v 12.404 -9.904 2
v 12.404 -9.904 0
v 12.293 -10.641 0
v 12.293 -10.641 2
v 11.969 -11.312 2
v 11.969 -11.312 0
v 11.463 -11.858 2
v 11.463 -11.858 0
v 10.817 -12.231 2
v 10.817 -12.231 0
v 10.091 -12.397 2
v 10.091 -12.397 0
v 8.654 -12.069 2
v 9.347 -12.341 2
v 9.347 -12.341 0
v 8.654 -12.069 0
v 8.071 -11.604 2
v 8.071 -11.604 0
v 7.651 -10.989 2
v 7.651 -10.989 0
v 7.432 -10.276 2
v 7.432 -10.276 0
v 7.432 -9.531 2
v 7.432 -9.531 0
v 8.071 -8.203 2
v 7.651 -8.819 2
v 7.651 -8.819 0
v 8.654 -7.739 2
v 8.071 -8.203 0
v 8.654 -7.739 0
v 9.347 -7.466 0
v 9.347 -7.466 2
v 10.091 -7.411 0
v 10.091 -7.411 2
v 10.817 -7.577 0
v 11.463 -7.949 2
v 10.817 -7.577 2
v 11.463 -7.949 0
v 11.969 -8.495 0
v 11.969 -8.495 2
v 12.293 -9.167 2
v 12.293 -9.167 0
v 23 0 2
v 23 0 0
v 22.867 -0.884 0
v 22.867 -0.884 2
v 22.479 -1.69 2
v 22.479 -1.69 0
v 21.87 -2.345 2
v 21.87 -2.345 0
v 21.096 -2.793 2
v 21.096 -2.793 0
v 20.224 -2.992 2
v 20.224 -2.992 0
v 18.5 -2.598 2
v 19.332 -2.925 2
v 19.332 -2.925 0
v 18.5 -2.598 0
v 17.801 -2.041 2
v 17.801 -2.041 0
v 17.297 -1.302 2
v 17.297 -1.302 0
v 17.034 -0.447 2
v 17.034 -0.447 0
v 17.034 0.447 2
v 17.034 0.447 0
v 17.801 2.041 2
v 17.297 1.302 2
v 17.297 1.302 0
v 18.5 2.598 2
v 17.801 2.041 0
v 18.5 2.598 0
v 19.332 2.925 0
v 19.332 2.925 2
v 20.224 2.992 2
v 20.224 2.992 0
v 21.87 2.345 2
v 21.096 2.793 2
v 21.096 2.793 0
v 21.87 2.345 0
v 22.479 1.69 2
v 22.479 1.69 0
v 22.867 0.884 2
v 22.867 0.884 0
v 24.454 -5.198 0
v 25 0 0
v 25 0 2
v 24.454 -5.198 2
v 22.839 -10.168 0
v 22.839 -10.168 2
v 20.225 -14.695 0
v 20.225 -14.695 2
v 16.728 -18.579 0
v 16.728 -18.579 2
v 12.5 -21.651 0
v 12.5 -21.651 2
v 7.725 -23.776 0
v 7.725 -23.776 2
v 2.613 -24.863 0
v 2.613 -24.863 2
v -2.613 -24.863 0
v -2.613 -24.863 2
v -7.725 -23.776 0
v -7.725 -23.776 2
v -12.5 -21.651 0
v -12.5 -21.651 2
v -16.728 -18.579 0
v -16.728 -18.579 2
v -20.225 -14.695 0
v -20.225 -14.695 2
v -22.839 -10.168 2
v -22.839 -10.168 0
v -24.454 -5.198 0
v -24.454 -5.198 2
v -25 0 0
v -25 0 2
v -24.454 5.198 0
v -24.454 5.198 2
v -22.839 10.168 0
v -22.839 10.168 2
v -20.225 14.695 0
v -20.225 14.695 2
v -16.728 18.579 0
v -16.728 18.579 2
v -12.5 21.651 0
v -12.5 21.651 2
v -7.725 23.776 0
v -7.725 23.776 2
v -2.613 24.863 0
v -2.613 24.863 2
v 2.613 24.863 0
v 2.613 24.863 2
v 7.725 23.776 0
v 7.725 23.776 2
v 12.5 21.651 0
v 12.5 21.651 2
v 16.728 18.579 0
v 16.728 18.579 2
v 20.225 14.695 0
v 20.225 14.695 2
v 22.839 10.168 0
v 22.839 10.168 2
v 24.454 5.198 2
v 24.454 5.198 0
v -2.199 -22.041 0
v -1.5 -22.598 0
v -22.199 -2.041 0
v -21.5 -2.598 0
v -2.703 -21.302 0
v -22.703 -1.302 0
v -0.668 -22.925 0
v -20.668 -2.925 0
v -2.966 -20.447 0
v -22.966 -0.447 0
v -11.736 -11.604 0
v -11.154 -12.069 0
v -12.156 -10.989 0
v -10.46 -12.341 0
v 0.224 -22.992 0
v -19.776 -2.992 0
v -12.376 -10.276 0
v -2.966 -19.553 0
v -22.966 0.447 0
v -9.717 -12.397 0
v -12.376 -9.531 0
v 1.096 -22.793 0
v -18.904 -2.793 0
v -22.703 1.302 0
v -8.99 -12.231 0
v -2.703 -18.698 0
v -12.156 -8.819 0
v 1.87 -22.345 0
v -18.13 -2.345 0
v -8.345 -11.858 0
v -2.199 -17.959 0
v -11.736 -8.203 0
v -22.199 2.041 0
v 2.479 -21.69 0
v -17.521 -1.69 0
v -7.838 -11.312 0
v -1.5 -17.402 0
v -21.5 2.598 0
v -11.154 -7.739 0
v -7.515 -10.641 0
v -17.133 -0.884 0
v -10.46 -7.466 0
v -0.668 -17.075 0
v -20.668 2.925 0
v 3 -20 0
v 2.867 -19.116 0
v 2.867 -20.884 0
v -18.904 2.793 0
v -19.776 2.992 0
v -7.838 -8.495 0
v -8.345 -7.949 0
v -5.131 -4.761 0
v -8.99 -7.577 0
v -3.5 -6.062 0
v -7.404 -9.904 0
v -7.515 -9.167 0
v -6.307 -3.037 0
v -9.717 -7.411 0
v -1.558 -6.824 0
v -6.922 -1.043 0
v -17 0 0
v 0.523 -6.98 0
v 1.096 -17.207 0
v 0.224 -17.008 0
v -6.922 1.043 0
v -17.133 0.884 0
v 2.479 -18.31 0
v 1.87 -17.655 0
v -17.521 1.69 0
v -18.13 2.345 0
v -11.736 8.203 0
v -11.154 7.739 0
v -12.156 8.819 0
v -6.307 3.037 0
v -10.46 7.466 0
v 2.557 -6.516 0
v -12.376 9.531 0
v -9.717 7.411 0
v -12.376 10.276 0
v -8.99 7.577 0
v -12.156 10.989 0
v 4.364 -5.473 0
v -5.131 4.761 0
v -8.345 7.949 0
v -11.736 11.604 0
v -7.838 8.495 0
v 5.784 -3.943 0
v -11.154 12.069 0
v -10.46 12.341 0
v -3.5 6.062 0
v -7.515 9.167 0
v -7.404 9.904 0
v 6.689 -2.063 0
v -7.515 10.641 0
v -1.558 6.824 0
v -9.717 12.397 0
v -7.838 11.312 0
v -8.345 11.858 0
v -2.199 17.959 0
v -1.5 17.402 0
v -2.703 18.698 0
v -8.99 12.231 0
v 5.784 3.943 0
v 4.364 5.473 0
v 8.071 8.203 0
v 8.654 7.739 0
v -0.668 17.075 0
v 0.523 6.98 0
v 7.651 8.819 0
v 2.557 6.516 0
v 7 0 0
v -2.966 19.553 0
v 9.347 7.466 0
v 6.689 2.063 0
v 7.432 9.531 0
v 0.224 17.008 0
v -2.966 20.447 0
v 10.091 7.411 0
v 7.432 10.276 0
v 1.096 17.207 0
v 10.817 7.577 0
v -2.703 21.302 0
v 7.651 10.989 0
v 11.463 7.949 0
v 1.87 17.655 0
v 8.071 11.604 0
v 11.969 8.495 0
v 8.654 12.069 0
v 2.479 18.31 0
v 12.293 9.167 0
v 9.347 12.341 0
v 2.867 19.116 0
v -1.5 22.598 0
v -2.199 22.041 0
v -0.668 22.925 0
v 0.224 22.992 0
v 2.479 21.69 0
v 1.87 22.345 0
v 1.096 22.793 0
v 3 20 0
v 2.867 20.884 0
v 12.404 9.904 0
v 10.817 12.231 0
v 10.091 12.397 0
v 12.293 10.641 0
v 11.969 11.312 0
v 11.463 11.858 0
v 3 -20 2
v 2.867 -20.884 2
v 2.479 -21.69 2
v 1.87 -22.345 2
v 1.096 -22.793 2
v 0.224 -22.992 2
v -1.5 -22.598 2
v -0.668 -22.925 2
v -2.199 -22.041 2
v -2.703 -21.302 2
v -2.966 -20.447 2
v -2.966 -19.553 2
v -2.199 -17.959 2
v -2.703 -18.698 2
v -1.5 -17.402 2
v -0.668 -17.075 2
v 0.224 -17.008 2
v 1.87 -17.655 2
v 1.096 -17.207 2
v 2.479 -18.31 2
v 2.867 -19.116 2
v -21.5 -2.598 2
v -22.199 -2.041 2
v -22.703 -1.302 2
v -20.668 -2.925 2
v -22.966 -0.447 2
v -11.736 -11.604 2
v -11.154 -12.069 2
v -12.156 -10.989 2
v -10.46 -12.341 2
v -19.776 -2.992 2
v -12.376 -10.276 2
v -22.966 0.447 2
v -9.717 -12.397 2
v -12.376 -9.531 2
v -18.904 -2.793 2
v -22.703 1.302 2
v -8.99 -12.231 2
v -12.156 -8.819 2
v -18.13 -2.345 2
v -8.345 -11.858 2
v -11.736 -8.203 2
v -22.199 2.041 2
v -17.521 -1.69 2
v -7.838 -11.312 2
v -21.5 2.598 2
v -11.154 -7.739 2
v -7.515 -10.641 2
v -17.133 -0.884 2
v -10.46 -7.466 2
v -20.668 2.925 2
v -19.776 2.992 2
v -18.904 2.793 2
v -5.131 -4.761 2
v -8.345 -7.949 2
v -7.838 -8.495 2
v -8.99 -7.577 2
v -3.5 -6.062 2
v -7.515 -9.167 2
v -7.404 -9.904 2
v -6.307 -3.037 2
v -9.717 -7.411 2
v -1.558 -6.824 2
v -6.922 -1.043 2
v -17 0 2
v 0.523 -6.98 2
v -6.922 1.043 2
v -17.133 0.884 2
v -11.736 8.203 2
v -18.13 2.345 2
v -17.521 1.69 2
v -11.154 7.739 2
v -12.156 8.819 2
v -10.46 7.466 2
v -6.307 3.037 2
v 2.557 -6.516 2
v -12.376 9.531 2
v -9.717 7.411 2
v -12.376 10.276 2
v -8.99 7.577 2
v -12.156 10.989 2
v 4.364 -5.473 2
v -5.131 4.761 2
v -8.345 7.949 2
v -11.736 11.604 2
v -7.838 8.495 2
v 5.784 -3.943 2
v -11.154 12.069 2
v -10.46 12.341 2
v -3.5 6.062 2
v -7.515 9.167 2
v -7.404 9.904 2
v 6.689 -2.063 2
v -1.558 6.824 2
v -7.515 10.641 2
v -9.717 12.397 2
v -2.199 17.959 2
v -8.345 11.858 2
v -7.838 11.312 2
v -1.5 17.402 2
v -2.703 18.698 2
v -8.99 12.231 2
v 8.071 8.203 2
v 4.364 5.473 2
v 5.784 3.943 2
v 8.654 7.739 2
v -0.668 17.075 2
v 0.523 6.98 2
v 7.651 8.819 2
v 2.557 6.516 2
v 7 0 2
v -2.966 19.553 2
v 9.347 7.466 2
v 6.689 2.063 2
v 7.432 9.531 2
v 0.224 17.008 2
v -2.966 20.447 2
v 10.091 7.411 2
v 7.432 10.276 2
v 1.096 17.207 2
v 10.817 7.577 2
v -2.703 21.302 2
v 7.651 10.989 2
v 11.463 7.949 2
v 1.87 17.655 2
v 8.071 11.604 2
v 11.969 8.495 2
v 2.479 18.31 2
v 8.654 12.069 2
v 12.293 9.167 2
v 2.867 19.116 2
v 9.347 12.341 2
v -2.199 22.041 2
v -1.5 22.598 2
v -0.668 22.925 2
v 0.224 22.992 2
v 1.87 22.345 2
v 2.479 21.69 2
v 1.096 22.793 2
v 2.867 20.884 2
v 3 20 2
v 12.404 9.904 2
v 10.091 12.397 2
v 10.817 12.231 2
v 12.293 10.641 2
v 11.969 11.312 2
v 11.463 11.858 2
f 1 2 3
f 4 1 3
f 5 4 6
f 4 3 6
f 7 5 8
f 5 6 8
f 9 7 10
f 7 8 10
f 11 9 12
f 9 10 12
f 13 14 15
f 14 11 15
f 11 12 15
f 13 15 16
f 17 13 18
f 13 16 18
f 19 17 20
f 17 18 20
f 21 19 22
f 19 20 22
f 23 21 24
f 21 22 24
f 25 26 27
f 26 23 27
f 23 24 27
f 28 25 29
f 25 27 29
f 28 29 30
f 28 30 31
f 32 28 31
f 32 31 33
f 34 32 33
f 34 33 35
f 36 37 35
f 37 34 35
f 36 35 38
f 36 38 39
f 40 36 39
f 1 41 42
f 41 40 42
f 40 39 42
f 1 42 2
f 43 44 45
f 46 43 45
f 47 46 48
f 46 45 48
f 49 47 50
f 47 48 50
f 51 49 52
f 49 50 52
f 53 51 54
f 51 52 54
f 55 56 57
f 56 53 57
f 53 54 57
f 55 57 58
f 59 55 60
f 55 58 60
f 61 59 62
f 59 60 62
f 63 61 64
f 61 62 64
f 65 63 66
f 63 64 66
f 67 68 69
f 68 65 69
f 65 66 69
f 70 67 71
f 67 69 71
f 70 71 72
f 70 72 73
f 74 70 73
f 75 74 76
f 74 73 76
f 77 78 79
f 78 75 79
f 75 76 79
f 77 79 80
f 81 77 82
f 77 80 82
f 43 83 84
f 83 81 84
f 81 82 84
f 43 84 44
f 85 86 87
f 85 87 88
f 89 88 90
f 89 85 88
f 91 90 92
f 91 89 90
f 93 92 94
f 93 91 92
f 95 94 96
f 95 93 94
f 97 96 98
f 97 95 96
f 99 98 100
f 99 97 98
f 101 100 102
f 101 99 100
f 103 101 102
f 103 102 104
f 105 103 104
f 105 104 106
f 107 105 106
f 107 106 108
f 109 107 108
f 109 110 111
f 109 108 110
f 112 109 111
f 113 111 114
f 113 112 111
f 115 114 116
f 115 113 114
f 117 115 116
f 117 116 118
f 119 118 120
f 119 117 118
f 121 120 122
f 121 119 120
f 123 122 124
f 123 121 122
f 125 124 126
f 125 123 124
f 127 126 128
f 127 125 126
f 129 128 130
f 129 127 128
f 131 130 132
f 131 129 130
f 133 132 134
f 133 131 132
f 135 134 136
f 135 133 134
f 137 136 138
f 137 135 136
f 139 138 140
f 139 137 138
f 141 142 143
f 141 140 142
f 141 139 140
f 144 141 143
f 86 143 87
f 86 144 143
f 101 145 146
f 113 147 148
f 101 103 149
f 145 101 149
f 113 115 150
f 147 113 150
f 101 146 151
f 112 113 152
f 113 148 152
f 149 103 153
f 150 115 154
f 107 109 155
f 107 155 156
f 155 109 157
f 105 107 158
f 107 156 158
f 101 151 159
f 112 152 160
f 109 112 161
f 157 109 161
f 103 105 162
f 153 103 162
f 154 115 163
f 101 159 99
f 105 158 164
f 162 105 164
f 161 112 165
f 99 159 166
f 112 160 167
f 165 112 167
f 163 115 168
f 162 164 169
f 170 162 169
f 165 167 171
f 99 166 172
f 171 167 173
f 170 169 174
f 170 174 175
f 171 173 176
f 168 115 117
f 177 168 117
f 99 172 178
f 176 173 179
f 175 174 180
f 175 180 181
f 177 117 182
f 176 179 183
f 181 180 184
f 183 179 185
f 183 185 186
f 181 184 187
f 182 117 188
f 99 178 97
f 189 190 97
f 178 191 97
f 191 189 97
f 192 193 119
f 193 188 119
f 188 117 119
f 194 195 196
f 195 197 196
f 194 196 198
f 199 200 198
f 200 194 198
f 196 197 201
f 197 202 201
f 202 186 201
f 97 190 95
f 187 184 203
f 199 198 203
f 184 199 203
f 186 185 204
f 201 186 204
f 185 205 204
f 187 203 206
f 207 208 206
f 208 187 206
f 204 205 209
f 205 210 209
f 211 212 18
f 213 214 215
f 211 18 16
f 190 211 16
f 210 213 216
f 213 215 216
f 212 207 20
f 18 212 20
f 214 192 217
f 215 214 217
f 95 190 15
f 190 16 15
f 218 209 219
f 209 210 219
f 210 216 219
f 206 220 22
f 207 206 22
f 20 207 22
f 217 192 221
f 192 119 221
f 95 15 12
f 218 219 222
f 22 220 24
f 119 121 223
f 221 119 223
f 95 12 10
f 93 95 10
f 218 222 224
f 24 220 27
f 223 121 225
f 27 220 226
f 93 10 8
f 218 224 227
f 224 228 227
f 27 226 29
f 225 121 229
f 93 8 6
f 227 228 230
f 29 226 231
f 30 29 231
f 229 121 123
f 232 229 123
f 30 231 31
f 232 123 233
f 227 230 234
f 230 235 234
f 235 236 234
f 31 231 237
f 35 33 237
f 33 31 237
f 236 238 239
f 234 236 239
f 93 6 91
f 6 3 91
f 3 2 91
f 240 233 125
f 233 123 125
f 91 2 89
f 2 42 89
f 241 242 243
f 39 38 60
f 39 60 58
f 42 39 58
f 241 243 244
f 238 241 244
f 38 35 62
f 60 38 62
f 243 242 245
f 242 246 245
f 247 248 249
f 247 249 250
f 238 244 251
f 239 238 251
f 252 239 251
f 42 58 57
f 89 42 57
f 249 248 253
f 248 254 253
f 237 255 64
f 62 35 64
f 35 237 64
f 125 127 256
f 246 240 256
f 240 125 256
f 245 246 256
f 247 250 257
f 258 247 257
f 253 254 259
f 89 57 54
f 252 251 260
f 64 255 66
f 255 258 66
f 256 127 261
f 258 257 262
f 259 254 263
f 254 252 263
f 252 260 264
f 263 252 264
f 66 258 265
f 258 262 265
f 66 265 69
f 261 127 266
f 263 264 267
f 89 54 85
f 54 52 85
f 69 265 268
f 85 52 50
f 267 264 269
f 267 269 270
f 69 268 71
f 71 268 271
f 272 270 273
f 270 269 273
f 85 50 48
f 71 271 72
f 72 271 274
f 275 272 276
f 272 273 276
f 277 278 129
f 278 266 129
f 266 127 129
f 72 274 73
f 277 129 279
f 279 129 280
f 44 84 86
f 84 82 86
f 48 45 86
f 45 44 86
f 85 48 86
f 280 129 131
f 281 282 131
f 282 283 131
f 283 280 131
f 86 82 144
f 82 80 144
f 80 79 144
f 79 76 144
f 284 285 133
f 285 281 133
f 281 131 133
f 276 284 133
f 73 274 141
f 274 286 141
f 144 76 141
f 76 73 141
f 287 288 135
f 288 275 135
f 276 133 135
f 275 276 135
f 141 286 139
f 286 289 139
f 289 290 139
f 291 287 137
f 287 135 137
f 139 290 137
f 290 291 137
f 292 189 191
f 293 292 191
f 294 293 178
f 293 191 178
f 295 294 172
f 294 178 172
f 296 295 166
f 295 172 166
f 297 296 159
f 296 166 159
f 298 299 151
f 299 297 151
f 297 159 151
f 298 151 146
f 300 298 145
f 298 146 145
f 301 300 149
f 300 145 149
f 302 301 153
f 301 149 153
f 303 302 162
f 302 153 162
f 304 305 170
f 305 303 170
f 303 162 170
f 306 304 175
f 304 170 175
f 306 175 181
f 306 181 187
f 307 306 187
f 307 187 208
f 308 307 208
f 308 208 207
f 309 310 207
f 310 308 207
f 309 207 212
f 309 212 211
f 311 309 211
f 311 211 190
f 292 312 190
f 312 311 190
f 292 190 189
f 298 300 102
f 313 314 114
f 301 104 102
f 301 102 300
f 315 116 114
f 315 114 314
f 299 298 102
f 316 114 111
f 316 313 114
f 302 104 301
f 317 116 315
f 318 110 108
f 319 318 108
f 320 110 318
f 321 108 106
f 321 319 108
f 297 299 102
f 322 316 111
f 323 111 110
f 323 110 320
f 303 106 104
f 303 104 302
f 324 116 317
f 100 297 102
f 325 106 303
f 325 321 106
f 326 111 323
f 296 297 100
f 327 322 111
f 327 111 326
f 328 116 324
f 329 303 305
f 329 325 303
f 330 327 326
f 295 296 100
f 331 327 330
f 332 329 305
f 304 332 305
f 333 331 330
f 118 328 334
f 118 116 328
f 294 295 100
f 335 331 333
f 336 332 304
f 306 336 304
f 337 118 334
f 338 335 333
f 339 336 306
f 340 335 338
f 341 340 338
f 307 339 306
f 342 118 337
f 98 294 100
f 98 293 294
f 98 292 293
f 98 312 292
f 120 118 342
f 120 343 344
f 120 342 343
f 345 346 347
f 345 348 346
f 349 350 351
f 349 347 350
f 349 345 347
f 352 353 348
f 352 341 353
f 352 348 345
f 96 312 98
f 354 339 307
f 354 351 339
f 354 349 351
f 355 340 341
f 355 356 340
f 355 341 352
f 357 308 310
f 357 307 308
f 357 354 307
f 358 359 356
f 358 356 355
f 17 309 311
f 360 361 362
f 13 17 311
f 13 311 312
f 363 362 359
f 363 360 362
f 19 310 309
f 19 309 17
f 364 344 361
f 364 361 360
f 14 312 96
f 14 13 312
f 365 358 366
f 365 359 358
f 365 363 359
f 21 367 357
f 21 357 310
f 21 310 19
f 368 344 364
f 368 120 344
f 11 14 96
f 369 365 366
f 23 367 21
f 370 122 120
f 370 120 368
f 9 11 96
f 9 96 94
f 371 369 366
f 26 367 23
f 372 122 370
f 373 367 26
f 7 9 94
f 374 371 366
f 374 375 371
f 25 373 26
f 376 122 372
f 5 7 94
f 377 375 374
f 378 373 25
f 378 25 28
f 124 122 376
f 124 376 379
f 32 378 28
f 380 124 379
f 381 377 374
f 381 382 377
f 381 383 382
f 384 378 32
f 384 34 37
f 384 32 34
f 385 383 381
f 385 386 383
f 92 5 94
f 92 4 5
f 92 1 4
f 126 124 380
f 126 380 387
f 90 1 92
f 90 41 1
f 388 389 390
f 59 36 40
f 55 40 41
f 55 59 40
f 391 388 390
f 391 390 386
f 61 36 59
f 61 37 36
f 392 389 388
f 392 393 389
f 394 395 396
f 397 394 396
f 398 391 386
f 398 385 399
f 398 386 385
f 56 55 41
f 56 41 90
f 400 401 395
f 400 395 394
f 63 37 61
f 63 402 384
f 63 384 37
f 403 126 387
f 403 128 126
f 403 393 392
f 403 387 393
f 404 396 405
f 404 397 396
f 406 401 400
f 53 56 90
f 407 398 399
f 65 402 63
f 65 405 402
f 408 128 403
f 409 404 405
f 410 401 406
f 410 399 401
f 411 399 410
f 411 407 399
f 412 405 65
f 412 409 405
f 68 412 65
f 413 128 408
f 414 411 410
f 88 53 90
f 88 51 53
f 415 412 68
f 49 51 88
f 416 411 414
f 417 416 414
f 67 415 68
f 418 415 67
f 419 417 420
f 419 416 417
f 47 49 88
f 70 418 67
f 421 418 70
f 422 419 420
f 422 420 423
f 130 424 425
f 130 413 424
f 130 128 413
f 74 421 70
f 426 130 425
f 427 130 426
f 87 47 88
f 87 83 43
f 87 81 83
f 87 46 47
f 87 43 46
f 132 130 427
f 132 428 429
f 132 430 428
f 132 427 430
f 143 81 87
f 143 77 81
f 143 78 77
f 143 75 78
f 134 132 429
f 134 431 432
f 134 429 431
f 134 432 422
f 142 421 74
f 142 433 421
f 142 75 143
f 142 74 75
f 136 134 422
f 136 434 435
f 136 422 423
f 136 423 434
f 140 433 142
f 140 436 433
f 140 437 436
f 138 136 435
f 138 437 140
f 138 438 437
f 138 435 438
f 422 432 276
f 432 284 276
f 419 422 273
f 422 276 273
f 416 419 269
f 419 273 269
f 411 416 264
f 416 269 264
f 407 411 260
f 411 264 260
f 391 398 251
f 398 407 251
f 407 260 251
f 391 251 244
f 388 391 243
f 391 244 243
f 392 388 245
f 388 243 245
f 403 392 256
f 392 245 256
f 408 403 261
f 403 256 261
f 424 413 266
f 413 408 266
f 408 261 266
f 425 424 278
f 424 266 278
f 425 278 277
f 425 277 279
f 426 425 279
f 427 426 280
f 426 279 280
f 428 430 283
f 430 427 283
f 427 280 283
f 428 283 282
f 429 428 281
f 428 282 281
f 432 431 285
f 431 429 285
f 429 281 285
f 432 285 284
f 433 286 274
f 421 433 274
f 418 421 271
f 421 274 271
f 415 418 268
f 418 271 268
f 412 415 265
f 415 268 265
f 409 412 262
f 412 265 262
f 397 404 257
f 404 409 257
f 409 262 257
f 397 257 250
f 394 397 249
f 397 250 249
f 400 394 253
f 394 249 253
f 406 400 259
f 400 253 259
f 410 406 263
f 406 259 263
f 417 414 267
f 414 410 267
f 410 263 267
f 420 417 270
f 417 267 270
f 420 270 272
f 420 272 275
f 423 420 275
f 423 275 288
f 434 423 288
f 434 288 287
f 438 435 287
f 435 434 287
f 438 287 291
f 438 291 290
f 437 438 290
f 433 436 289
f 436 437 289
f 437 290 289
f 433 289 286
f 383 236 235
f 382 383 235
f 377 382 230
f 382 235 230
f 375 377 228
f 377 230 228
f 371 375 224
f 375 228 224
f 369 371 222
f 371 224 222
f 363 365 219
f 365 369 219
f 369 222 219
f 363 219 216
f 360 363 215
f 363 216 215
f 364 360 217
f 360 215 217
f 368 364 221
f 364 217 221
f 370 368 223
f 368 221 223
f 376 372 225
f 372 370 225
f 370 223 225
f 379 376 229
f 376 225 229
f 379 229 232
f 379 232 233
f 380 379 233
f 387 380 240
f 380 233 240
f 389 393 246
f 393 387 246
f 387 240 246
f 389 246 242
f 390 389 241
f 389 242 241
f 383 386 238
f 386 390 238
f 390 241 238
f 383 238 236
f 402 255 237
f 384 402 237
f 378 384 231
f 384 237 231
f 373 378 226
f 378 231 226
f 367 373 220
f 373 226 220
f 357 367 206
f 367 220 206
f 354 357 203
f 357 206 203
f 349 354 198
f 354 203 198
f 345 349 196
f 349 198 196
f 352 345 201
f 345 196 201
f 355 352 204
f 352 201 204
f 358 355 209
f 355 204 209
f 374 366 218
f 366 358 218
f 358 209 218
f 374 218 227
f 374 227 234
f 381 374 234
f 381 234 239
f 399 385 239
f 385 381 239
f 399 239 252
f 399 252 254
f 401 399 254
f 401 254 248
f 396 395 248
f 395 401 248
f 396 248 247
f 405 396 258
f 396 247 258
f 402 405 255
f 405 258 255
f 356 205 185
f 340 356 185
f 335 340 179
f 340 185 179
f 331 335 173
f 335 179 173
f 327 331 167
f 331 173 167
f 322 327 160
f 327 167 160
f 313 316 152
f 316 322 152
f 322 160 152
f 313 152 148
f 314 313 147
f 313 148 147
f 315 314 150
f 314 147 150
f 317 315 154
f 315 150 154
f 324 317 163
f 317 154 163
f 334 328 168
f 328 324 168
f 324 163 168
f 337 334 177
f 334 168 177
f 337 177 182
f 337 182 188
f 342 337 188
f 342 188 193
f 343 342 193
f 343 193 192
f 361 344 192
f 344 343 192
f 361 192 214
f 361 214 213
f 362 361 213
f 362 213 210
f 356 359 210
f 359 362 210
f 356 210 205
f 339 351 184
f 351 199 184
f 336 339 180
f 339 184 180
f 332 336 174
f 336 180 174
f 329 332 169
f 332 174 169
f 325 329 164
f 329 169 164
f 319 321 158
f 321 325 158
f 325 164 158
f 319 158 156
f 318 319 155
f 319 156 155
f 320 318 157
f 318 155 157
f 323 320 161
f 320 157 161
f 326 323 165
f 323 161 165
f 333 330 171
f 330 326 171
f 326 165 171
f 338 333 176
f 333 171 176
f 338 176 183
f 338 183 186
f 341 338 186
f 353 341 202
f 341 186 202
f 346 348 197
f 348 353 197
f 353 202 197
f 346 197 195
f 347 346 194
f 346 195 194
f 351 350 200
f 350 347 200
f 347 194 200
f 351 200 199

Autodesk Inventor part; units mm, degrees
ref_plane "YZ Plane" through (0, 0, 0) normal (1, 0, 0) x (0, 1, 0)
ref_plane "XZ Plane" through (0, 0, 0) normal (0, 1, 0) x (-1, 0, 0)
ref_plane "XY Plane" through (0, 0, 0) normal (0, 0, 1) x (1, 0, 0)
sketch "Boceto1" plane through (0, 0, 0) normal (0, 0, 1) x (1, 0, 0)
  circle A0 centre (-9.9038, -9.9038) radius 2.5
  circle A1 centre (-9.9038, 9.9038) radius 2.5
  circle A2 centre (-20, 0) radius 3
  circle A3 centre (0, 20) radius 3
  circle A4 centre (20, 0) radius 3
  circle A5 centre (0, -20) radius 3
  circle A6 centre (0, 0) radius 25
  circle A7 centre (0, 0) radius 7
  circle A8 centre (9.9038, 9.9038) radius 2.5
  circle A9 centre (9.9038, -9.9038) radius 2.5
extrude "Extrusión1" add sketch "Boceto1" along normal blind 2
properties part number "_3DPrint"
